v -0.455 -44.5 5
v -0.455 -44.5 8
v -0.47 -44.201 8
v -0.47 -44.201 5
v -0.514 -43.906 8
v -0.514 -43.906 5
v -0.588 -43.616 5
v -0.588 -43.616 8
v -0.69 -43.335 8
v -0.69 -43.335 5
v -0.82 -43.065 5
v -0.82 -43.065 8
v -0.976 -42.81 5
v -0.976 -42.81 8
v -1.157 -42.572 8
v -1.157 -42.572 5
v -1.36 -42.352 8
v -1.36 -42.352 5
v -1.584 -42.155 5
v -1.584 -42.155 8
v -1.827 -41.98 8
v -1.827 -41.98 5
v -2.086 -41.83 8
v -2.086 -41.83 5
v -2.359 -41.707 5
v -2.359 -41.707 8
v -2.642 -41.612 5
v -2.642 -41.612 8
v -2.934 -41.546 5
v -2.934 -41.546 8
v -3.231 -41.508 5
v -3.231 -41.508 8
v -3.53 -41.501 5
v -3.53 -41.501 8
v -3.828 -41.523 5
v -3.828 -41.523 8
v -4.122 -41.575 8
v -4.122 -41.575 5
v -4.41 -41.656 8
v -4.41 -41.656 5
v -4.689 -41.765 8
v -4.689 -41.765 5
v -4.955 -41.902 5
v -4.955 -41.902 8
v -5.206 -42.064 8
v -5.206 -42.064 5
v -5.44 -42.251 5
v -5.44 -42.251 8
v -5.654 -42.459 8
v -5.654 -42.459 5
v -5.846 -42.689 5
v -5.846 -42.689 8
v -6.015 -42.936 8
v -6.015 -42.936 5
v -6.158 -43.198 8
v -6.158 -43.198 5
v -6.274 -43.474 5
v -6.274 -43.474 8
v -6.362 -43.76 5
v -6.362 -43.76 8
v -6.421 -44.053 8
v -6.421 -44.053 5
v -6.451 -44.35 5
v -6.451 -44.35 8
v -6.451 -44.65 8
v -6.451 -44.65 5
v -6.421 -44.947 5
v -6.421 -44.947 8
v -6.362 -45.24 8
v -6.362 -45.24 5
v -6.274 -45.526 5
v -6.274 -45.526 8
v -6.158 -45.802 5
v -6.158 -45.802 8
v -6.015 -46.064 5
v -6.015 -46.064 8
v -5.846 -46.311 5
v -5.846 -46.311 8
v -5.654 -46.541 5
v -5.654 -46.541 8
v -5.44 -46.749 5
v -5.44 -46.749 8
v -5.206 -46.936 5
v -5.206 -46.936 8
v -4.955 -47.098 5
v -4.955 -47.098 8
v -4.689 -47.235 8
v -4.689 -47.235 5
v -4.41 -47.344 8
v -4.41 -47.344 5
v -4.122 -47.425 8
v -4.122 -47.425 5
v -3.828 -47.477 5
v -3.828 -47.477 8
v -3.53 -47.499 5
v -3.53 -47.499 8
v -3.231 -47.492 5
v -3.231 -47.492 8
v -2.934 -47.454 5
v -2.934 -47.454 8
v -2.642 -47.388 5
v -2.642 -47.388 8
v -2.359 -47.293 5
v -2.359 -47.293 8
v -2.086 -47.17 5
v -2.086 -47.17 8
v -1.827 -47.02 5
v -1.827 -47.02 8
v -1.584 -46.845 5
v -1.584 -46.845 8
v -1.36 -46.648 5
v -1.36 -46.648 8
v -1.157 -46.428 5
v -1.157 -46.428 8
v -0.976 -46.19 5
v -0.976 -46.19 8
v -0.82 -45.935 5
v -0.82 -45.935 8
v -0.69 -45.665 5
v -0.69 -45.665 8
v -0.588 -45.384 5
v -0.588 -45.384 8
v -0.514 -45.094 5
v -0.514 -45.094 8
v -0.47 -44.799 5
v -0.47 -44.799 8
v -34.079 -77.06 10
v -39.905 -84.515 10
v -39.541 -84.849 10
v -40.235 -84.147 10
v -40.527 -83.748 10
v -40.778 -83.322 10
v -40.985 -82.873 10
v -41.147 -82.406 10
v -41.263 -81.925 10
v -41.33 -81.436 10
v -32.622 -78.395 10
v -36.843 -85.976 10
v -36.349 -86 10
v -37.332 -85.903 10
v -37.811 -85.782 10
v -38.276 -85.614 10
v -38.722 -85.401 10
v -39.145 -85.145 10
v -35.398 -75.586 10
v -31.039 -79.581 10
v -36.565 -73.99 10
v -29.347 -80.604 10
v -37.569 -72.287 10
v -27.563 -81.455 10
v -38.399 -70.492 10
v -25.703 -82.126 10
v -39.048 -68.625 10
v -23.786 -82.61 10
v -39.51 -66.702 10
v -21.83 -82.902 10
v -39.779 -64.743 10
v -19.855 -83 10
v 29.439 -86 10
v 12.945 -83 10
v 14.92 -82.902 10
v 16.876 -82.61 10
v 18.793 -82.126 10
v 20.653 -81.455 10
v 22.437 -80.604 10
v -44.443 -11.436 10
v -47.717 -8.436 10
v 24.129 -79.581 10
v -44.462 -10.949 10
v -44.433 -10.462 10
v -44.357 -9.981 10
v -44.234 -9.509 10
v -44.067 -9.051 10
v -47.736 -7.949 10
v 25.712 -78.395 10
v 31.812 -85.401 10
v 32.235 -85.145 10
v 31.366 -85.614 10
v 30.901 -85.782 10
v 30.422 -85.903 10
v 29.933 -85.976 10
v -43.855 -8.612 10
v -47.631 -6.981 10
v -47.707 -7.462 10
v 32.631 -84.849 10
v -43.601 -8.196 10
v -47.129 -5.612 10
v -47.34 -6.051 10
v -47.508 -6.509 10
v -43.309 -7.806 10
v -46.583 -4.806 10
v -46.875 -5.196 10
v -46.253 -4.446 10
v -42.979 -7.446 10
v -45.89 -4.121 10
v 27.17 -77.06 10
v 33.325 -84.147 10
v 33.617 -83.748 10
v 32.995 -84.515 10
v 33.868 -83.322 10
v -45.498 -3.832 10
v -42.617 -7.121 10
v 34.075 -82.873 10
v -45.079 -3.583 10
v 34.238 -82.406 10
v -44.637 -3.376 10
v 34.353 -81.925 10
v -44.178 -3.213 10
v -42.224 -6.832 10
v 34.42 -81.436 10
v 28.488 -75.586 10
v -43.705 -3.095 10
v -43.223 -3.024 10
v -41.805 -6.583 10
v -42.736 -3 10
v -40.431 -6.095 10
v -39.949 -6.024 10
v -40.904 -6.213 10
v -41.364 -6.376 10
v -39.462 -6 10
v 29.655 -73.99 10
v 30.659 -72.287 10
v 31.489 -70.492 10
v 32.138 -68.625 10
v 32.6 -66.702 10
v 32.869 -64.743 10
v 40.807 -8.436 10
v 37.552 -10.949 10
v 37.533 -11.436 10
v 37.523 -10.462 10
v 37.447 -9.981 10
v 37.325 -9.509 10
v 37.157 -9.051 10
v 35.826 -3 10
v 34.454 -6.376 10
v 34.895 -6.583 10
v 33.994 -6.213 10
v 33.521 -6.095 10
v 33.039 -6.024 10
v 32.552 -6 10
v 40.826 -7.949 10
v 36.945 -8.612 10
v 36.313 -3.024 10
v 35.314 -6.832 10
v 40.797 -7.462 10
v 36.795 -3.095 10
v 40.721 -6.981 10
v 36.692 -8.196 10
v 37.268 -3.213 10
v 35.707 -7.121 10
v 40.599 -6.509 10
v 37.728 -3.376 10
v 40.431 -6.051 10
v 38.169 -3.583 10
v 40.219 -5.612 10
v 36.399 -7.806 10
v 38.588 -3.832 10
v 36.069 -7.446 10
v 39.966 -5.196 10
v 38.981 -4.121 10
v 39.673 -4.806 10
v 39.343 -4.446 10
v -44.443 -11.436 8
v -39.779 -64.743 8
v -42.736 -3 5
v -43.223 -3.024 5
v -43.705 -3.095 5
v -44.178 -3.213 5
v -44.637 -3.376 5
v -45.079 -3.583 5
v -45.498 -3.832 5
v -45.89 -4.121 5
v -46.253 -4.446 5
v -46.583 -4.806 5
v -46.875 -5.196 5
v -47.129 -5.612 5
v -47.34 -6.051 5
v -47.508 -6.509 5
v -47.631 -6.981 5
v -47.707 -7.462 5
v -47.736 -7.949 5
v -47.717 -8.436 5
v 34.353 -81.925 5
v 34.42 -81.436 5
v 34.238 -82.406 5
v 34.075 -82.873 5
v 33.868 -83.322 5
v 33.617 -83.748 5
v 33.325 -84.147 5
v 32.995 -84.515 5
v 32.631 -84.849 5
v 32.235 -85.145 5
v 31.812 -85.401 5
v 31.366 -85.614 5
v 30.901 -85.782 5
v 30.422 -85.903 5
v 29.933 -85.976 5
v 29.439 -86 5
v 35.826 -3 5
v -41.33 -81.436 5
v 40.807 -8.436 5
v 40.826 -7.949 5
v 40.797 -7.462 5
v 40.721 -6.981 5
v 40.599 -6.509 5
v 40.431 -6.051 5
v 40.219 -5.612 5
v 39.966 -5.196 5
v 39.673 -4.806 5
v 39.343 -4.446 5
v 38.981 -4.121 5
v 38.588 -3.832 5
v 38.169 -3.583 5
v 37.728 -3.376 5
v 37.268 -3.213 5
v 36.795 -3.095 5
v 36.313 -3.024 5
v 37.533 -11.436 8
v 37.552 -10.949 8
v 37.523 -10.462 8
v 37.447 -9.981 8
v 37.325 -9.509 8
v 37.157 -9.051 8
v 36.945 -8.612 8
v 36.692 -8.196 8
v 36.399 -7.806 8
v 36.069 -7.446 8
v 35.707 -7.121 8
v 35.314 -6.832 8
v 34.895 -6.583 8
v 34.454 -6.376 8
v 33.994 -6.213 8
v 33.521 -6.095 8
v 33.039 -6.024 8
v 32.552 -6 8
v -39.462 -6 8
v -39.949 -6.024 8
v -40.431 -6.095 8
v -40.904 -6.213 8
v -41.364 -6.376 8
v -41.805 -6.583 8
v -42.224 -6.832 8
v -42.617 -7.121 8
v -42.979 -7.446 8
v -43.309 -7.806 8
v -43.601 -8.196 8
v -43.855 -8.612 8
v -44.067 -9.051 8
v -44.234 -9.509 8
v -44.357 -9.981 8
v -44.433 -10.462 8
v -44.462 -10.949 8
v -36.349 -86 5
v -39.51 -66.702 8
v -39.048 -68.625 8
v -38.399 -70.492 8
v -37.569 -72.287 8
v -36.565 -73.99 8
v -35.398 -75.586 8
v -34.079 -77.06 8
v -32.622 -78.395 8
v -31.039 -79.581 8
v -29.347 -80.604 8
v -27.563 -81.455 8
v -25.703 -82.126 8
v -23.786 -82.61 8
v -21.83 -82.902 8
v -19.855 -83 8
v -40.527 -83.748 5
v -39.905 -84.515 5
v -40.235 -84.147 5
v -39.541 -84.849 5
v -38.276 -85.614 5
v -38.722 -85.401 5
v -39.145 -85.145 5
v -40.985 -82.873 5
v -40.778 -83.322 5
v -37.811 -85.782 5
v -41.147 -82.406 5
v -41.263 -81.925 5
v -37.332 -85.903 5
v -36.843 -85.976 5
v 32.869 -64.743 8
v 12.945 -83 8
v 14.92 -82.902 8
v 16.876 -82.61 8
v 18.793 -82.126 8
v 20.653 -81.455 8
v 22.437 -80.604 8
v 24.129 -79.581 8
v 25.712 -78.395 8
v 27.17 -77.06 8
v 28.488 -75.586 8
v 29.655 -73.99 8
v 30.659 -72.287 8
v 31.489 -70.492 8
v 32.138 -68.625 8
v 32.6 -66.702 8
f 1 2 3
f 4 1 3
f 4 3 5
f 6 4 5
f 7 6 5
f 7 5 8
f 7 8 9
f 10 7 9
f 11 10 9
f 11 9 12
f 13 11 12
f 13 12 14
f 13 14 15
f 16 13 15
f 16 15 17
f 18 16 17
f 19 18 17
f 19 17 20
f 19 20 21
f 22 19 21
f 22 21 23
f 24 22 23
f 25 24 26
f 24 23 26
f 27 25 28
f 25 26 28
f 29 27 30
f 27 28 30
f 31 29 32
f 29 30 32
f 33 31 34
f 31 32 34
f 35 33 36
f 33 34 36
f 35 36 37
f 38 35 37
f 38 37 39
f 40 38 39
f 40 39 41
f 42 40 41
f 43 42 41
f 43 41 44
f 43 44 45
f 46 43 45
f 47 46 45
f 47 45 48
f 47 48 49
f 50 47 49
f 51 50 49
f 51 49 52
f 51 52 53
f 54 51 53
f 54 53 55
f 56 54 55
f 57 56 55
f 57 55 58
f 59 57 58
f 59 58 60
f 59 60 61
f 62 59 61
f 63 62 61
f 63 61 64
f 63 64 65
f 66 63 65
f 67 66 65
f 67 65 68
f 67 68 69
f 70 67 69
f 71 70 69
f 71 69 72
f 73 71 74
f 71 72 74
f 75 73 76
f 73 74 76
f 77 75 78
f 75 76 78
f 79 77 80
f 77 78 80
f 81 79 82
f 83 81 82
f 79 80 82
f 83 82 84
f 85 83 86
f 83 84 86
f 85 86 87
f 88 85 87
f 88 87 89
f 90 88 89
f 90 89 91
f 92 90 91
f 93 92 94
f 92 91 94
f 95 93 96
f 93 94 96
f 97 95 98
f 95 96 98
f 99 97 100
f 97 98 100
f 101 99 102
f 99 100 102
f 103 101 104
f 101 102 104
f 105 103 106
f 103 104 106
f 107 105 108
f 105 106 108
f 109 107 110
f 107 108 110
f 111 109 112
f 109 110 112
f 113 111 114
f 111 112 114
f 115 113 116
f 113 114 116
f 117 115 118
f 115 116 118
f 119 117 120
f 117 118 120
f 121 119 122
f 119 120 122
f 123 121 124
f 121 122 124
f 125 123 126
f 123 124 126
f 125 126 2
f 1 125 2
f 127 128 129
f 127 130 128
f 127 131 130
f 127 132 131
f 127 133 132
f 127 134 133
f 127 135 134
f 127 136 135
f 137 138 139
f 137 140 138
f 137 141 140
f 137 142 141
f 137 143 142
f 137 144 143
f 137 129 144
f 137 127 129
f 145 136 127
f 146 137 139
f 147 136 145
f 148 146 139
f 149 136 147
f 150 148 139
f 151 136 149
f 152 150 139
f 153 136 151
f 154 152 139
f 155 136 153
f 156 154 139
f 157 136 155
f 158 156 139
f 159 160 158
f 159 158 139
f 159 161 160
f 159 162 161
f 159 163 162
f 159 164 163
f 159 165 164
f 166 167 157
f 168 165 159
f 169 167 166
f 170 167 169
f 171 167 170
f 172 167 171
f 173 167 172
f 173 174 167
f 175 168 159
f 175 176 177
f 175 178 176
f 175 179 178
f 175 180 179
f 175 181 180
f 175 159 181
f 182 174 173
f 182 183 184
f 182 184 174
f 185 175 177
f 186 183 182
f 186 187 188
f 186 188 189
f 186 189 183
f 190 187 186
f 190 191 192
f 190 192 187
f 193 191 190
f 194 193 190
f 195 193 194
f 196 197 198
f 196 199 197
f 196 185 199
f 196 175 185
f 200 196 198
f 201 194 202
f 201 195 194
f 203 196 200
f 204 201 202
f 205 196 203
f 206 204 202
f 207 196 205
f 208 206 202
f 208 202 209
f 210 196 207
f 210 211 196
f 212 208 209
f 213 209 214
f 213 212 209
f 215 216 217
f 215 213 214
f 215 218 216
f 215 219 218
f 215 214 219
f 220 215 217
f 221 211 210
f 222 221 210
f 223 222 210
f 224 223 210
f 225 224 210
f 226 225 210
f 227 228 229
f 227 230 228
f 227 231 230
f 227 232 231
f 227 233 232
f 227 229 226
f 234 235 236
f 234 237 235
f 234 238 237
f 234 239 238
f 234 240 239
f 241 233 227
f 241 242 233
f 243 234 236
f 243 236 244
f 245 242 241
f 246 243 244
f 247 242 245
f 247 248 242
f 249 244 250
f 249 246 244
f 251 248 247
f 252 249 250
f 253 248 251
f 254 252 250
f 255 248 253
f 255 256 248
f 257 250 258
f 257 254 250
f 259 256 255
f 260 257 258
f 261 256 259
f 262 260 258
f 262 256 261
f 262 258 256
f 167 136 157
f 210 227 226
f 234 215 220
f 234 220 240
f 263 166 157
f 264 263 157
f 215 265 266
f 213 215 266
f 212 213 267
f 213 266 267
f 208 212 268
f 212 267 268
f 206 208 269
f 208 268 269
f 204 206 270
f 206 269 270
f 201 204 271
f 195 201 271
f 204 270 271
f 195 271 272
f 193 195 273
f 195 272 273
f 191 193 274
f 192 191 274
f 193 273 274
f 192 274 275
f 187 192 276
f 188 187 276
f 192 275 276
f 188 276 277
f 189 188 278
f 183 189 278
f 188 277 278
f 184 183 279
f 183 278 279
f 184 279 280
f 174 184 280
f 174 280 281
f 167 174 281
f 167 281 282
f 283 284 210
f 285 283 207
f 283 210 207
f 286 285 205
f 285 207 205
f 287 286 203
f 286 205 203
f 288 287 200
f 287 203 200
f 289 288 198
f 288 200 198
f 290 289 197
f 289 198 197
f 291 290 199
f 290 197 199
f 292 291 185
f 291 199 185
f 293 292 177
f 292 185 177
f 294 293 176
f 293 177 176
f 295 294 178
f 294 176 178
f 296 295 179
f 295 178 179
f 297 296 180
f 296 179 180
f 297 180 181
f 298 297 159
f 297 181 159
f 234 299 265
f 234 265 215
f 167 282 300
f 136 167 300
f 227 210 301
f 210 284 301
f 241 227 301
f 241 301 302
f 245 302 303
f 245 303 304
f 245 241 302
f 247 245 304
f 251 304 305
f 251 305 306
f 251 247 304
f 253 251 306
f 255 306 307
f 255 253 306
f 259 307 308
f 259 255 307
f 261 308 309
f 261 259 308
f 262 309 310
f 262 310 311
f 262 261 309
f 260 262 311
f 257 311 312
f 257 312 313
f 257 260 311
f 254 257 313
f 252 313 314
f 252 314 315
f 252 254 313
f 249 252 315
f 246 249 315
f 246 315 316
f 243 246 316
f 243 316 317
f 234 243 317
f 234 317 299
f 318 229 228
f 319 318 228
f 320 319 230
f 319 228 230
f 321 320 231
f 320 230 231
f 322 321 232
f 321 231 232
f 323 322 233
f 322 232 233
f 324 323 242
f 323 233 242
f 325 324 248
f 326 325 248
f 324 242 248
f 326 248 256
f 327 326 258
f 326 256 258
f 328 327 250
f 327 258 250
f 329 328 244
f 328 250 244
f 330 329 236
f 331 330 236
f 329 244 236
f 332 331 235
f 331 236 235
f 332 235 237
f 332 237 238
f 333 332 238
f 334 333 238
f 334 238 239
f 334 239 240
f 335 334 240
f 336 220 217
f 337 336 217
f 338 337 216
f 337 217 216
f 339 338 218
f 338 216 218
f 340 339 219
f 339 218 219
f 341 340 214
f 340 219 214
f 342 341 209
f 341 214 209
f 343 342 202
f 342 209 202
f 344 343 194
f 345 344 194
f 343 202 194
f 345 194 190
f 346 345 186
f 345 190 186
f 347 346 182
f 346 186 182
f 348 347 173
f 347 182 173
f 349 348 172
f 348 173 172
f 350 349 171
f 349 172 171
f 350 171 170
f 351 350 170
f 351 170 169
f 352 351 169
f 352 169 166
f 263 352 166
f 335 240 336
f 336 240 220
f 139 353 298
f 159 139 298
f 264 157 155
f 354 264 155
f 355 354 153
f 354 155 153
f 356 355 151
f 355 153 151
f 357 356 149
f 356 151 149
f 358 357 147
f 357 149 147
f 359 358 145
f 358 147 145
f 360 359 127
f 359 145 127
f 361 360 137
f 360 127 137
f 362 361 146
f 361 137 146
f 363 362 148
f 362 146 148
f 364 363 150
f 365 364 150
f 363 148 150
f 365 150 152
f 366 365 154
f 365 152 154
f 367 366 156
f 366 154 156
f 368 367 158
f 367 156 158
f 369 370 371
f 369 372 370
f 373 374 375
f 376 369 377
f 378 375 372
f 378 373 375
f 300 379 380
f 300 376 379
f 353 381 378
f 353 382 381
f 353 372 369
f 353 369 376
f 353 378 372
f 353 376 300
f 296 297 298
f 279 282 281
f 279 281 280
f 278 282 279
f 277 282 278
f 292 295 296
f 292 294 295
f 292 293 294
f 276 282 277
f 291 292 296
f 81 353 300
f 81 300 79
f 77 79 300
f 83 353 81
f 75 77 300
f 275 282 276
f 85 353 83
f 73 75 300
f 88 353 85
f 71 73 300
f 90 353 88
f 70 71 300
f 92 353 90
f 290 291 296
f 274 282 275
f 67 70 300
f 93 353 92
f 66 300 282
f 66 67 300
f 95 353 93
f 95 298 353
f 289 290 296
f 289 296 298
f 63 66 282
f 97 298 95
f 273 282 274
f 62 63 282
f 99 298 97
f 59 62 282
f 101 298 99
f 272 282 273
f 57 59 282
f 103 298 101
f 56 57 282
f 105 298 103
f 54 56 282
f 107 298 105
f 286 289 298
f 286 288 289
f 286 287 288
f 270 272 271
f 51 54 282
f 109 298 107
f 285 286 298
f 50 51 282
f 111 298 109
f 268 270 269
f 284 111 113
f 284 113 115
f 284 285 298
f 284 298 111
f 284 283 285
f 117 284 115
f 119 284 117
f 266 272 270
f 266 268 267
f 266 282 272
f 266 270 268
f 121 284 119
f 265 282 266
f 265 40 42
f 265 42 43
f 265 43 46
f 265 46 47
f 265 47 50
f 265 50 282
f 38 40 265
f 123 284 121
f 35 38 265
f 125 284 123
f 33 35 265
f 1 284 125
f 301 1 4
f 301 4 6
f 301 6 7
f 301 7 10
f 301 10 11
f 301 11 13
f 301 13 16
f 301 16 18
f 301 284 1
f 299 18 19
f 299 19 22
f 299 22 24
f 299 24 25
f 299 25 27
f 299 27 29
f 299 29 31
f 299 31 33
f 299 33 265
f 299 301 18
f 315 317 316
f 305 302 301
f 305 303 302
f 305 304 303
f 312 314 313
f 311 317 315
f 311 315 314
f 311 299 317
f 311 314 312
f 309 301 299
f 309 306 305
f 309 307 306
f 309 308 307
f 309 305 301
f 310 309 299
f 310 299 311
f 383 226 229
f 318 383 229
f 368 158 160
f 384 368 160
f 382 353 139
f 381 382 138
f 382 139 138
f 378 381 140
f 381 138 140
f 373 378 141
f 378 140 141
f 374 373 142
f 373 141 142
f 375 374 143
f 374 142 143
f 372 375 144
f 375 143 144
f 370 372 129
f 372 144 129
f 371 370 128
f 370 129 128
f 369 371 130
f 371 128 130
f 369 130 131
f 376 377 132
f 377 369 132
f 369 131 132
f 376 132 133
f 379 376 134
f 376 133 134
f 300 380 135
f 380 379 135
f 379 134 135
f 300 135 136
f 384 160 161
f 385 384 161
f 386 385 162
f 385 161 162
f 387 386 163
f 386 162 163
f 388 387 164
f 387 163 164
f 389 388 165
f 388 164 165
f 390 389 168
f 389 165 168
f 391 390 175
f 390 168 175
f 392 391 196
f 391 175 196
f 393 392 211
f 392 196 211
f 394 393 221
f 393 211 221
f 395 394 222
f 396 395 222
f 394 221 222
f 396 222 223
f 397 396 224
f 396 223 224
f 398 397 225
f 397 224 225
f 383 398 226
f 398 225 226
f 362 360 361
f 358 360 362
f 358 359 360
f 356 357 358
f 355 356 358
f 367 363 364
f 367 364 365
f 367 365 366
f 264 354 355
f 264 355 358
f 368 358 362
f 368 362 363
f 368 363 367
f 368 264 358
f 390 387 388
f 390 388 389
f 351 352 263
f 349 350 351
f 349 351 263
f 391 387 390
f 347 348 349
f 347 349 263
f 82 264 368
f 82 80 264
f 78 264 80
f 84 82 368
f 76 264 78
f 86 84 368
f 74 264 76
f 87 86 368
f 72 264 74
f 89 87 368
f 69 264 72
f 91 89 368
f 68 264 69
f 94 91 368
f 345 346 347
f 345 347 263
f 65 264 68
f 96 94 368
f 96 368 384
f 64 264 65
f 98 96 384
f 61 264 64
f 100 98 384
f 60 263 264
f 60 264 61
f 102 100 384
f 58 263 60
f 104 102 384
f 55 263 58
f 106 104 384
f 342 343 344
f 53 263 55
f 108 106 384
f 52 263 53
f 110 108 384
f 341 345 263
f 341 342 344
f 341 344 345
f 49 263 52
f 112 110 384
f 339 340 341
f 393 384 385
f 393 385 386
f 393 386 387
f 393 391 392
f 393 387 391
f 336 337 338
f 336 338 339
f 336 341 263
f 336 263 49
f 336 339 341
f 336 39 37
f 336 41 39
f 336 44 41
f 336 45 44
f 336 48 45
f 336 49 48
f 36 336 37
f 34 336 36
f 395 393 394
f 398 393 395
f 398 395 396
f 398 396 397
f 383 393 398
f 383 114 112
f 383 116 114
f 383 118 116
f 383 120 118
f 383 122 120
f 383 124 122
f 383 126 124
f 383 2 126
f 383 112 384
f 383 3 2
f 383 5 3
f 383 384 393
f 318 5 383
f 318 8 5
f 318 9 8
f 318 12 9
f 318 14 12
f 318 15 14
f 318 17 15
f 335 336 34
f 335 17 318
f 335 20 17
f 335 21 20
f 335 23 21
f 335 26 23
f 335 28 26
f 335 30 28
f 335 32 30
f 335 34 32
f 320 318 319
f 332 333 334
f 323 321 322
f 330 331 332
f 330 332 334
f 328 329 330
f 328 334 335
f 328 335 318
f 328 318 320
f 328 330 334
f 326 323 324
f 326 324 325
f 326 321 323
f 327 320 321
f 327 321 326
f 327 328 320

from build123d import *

# Parameters (mm, degrees)
F1_DEPTH  = 10
F2_W      = 90
F2_H      = 40
F2_H_2    = 10
F3_DEPTH  = 10
F4_R      = 5
F5_R      = 4
F6_DEPTH  = 25
F7_R      = 3
F8_R      = 3
F10_DEPTH = 2
F11_R     = 3
F12_DEPTH = 25
F13_W     = 33.655686304
F13_H     = 120.6225939095
F14_DEPTH = 90.001
F15_R     = 5
F16_W     = 90.2396612329
F16_H     = 12.9153318724
F17_DEPTH = 50


with BuildPart() as f1:
    # F0 (on Top) → F1 (new body)
    with BuildSketch(Plane.XY):
        Polygon((41.5450818927, 0), (-48.4549181073, 0), (-40.9308930441, -86), (34.0210568295, -86), align=None)
    extrude(amount=F1_DEPTH)

    # F2 (on face) → F3 (join)
    with BuildSketch(Plane(origin=(0, 0, 0), x_dir=(-1, 0, 0), z_dir=(0, 1, 0))):
        with Locations((3.4549181073, 30)):
            Rectangle(F2_W, F2_H)
        with Locations((3.4549181073, 5)):
            Rectangle(F2_W, F2_H_2)
        with Locations((3.4549181073, -20)):
            Rectangle(F2_W, F2_H)
    extrude(amount=F3_DEPTH)

    # F4
    f4_edges = [f1.edges().sort_by_distance(p)[0] for p in [
        (-40.930893, -86, 5),
        (34.021057, -86, 5),
    ]]
    fillet(f4_edges, radius=F4_R)

    # F5 (on face) → F6 (cut)
    with BuildSketch(Plane.XZ):
        with Locations((-28.4549181073, 40)):
            Circle(F5_R)
        with Locations((21.5450818927, 40)):
            Circle(F5_R)
    extrude(amount=-F6_DEPTH, mode=Mode.SUBTRACT)

    # F7
    f7_edges = [f1.edges().sort_by_distance(p)[0] for p in [
        (-48.454918, 5, 50),
        (41.545082, 5, 50),
        (41.545082, 5, -40),
        (-48.454918, 5, -40),
    ]]
    fillet(f7_edges, radius=F7_R)

    # F8
    f8_edges = [f1.edges().sort_by_distance(p)[0] for p in [
        (-3.454918, 0, 10),
    ]]
    fillet(f8_edges, radius=F8_R)

    # F9 (on face) → F10 (cut)
    with BuildSketch(Plane.XY.offset(10)):
        with BuildLine():
            ThreePointArc((37.533121384, -11.4357787137), (36.2385345776, -7.6220489619), (32.5521478936, -6))
            Line((32.5521478936, -6), (-39.4619841082, -6))
            ThreePointArc((-39.4619841082, -6), (-43.1483707922, -7.6220489619), (-44.4429575986, -11.4357787137))
            Line((-44.4429575986, -11.4357787137), (-39.7791700035, -64.743114855))
            ThreePointArc((-39.7791700035, -64.743114855), (-33.367080194, -77.7455467362), (-19.8552760417, -83))
            Line((-19.8552760417, -83), (12.9454398271, -83))
            ThreePointArc((12.9454398271, -83), (26.4572439794, -77.7455467362), (32.8693337889, -64.743114855))
            Line((32.8693337889, -64.743114855), (37.533121384, -11.4357787137))
        make_face()
    extrude(amount=-F10_DEPTH, mode=Mode.SUBTRACT)

    # F11 (on face) → F12 (cut)
    with BuildSketch(Plane.XY.offset(8)):
        with Locations((-3.4549181073, -44.5)):
            Circle(F11_R)
    extrude(amount=-F12_DEPTH, mode=Mode.SUBTRACT)

    # F13 (on face) → F14 (cut, through all)
    with BuildSketch(Plane(origin=(-48.4549181073, 0, 0), x_dir=(0, -1, 0), z_dir=(-1, 0, 0))):
        with Locations((-13.827843152, 2.30451487)):
            Rectangle(F13_W, F13_H)
    extrude(amount=-F14_DEPTH, mode=Mode.SUBTRACT)

    # F15
    f15_edges = [f1.edges().sort_by_distance(p)[0] for p in [
        (-48.192452, -3, 5),
        (41.282616, -3, 5),
    ]]
    fillet(f15_edges, radius=F15_R)

    # F16 (on Right) → F17 (cut, symmetric)
    with BuildSketch(Plane.YZ):
        with Locations((-45.4951552674, -1.4576659362)):
            Rectangle(F16_W, F16_H)
    extrude(amount=F17_DEPTH, both=True, mode=Mode.SUBTRACT)


solid = f1.part
